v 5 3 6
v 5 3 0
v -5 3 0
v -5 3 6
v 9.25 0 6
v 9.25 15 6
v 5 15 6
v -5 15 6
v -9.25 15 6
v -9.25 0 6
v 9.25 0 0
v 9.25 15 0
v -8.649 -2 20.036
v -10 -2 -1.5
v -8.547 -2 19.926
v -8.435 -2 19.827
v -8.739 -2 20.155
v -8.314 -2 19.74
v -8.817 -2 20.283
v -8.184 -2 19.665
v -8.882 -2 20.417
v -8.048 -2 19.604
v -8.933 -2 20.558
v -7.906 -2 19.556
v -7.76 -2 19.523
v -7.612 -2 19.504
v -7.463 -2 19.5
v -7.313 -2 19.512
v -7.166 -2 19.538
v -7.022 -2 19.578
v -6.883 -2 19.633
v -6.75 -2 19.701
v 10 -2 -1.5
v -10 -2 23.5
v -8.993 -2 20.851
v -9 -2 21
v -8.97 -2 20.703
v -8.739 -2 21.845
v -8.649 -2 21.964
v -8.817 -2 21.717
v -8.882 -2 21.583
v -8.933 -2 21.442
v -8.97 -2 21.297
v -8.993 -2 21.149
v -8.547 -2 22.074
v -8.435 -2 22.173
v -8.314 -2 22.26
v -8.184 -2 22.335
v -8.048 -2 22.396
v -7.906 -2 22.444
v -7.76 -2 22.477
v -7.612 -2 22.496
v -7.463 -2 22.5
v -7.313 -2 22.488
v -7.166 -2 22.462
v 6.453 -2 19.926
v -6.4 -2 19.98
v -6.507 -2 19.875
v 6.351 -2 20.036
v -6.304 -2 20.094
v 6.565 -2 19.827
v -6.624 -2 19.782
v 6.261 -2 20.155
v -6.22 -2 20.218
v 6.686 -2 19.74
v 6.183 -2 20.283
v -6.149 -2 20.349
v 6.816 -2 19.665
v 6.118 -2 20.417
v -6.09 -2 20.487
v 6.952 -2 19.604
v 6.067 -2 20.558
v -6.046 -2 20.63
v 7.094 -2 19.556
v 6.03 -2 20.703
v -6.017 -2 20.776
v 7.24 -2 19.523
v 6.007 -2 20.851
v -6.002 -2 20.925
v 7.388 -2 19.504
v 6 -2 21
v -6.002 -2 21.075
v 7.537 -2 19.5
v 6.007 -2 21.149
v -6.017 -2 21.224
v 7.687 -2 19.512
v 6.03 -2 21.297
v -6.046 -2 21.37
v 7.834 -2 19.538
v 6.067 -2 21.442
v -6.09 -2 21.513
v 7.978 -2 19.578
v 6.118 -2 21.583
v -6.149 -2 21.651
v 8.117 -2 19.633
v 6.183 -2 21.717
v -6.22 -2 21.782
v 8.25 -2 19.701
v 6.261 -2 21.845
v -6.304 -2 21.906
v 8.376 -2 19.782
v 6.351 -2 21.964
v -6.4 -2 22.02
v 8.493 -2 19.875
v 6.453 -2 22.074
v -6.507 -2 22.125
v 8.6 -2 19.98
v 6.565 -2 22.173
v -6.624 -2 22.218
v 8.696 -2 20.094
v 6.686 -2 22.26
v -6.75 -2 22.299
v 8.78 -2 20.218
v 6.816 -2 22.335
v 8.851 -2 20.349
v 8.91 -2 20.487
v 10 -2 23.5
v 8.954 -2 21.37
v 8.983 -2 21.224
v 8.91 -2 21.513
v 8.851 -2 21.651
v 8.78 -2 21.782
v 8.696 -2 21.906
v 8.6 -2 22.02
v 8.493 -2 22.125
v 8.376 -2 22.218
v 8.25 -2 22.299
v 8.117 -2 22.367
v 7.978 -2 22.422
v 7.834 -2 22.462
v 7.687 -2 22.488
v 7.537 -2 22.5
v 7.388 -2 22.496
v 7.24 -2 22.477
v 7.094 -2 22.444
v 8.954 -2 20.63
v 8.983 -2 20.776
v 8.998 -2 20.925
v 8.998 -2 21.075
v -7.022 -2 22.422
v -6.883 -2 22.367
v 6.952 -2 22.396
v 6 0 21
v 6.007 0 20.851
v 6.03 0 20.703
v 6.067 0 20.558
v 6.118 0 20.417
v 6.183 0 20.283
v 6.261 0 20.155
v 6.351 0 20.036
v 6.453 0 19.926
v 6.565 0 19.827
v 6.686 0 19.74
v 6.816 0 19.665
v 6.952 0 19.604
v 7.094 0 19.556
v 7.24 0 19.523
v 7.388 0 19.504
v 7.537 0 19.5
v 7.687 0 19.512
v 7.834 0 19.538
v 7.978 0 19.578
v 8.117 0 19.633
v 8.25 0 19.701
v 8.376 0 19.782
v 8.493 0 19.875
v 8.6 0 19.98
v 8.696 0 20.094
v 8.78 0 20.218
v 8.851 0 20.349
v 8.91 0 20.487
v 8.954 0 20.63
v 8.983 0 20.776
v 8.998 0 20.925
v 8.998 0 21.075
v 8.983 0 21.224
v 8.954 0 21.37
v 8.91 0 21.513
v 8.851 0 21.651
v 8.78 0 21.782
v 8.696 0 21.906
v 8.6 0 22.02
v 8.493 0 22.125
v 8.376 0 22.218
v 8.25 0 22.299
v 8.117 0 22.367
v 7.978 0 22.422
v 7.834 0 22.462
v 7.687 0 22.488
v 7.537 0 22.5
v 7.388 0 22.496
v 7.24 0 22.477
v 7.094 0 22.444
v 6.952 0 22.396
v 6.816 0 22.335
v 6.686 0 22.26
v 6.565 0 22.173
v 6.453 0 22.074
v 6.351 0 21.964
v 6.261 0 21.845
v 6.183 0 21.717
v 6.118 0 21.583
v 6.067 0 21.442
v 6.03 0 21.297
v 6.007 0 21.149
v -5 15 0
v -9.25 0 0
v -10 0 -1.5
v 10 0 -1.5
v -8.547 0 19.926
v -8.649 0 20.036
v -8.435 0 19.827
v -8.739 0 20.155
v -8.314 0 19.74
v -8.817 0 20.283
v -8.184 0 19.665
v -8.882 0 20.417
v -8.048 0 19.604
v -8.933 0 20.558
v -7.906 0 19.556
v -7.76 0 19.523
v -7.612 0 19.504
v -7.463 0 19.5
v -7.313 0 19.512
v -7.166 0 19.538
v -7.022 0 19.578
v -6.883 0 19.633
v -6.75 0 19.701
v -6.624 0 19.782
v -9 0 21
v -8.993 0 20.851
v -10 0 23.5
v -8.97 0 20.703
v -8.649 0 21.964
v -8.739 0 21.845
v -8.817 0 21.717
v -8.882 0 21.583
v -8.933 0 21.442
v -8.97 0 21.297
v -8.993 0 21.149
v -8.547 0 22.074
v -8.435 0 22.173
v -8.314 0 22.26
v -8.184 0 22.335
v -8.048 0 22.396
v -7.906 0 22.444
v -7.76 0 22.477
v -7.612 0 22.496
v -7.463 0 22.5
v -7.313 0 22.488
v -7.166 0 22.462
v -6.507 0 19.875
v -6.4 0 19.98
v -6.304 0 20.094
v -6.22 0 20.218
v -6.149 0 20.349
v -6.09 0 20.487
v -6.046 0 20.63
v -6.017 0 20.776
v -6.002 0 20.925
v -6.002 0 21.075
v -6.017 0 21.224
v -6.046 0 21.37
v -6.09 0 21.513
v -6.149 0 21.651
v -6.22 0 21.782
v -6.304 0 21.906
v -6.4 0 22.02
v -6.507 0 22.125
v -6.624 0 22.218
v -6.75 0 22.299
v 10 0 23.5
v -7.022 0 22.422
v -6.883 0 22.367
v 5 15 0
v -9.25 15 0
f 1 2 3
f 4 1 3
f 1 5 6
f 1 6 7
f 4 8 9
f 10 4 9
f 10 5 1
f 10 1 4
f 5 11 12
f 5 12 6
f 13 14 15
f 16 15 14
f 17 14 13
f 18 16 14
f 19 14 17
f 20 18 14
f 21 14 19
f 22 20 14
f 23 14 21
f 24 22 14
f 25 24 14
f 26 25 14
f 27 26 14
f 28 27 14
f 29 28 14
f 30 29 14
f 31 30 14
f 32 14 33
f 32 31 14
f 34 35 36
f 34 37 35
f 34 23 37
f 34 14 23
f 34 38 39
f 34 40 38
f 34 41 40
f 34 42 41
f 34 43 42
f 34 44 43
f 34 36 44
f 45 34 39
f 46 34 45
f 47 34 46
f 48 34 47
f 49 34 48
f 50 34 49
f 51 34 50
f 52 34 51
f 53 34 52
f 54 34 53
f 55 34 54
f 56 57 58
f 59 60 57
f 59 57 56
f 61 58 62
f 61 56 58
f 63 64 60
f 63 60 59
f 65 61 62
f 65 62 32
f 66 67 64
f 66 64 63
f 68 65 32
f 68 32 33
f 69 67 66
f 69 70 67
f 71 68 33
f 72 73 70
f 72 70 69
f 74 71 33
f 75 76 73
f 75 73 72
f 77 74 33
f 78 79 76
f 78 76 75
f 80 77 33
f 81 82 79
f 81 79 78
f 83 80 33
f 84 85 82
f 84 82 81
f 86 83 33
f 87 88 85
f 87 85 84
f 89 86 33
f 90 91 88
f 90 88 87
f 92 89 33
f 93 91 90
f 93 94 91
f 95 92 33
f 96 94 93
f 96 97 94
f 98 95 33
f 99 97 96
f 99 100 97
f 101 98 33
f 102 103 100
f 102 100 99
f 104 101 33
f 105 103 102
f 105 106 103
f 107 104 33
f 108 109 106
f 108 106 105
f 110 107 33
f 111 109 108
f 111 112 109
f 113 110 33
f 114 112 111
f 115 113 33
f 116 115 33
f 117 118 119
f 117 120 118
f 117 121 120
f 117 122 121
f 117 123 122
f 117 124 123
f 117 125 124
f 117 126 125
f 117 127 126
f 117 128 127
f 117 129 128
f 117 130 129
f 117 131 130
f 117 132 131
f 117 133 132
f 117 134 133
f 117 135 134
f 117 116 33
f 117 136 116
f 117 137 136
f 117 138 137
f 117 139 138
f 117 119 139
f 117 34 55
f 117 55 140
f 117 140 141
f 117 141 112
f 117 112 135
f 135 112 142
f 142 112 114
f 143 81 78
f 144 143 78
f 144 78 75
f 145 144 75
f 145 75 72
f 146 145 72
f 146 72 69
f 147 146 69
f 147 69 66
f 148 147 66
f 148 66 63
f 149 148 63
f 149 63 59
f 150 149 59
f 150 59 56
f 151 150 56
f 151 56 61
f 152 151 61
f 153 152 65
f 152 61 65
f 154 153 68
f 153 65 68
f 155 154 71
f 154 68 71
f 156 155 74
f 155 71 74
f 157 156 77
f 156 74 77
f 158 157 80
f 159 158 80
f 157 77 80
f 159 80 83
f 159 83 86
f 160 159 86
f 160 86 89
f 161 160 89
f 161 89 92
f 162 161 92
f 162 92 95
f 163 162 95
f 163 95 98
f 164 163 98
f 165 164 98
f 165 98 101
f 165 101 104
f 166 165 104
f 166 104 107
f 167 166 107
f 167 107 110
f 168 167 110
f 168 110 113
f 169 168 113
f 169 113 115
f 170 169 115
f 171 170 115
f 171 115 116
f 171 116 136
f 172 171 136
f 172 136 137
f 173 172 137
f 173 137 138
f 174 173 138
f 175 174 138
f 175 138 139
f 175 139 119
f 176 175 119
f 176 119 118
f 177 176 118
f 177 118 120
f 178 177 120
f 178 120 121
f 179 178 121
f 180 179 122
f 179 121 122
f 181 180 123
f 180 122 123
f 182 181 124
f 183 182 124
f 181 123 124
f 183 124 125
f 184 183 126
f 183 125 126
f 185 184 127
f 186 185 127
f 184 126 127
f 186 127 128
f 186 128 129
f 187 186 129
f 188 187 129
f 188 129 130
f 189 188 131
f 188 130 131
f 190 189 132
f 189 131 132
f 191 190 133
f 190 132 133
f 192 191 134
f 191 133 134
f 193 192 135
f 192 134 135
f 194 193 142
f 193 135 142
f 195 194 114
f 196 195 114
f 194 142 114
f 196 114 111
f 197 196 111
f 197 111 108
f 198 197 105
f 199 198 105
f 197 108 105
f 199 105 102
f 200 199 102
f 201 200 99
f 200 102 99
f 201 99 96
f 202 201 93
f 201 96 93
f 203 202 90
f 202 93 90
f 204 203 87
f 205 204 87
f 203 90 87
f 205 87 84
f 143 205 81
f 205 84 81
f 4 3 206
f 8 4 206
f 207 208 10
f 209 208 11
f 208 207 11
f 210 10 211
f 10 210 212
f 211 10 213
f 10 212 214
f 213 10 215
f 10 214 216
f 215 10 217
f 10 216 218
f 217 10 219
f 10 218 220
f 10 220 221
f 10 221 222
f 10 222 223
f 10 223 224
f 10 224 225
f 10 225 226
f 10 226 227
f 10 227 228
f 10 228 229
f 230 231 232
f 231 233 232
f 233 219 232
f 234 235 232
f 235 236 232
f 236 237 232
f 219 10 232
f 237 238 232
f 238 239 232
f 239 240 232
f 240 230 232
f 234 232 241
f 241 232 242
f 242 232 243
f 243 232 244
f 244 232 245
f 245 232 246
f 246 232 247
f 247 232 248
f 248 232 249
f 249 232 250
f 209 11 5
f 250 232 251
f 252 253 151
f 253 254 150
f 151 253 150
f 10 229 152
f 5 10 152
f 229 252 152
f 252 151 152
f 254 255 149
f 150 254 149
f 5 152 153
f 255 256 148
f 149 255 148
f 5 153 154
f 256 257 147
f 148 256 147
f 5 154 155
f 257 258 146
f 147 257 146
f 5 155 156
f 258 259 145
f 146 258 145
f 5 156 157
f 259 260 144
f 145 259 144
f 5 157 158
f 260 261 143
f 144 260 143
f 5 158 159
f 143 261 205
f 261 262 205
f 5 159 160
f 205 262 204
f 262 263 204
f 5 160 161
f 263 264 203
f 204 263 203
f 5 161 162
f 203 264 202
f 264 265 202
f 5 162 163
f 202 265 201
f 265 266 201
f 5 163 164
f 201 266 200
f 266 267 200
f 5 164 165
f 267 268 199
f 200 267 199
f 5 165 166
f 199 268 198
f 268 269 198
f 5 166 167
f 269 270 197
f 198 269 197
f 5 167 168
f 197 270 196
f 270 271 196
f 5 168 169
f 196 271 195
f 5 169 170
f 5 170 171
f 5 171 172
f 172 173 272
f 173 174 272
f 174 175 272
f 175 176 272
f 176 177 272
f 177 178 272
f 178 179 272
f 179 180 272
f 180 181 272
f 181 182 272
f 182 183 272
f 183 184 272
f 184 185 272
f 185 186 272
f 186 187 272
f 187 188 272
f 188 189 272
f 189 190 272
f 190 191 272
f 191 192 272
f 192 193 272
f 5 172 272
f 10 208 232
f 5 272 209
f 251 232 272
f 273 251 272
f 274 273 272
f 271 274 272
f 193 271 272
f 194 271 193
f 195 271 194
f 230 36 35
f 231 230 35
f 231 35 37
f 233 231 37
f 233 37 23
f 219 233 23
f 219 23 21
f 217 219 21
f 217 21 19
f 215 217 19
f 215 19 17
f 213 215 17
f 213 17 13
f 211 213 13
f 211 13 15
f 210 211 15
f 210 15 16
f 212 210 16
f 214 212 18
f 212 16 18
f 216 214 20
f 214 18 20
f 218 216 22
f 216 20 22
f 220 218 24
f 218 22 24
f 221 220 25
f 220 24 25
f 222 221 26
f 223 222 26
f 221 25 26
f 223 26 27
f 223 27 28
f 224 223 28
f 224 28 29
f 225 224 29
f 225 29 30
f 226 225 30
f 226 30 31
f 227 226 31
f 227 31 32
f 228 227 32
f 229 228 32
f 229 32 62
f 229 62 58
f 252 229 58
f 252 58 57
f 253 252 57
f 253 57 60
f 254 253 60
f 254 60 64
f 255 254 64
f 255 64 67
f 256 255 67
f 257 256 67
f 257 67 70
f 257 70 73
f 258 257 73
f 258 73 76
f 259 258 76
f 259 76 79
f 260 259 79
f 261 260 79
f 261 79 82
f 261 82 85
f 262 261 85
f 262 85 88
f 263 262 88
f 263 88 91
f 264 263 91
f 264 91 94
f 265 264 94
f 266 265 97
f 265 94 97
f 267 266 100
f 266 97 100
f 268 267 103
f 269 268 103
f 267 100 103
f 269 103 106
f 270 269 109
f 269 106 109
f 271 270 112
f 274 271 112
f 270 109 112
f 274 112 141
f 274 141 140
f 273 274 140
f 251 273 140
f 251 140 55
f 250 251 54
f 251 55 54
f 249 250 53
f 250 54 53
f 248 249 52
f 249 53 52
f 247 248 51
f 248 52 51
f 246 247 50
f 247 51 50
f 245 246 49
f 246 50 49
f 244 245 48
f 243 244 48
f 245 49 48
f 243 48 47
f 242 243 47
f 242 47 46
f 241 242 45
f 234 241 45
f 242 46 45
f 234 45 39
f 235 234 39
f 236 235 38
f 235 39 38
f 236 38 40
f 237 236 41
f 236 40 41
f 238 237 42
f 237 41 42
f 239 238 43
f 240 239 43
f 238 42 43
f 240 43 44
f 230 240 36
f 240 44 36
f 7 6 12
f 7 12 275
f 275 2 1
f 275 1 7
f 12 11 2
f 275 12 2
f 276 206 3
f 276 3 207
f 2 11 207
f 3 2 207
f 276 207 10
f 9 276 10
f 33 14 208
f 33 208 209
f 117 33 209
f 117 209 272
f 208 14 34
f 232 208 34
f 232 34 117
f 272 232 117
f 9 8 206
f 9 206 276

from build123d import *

# Parameters (mm, degrees)
SKETCH_1_W            = 20
SKETCH_1_H            = 25
EXTRUDE_1_DEPTH       = 2
SKETCH_2_W            = 18.5
SKETCH_2_H            = 6
EXTRUDE_2_DEPTH       = 15
SKETCH_3_W            = 10
SKETCH_3_H            = 12
CUT_EXTRUDE_1_DEPTH   = 30.618406439
HOLE_WIZARD_3_0_3_1_D = 3


with BuildPart() as part:
    # 草圖1 → 填料-伸長1 (new body)
    with BuildSketch(Plane.XZ.offset(2)):
        with Locations((0, 11)):
            Rectangle(SKETCH_1_W, SKETCH_1_H)
    extrude(amount=-EXTRUDE_1_DEPTH)

    # 草圖2 → 填料-伸長2 (add)
    with BuildSketch(Plane(origin=(0, 0, 0), x_dir=(-1, 0, 0), z_dir=(0, 1, 0))):
        with Locations((0, 3)):
            Rectangle(SKETCH_2_W, SKETCH_2_H)
    extrude(amount=EXTRUDE_2_DEPTH)

    # 草圖3 → 除料-伸長1 (cut, through all)
    with BuildSketch(Plane(origin=(0, 0, 0), x_dir=(-1, 0, 0), z_dir=(0, 0, -1))):
        with Locations((0, 9)):
            Rectangle(SKETCH_3_W, SKETCH_3_H)
    extrude(amount=-CUT_EXTRUDE_1_DEPTH, mode=Mode.SUBTRACT)

    # Ø3.0 (3) 直徑孔1 (through all)
    with Locations(Plane(origin=(0, 0, 0), x_dir=(1, 0, 0), z_dir=(0, 1, 0))):
        with Locations((-7.5, -21), (7.5, -21)):
            Hole(HOLE_WIZARD_3_0_3_1_D / 2)


solid = part.part
